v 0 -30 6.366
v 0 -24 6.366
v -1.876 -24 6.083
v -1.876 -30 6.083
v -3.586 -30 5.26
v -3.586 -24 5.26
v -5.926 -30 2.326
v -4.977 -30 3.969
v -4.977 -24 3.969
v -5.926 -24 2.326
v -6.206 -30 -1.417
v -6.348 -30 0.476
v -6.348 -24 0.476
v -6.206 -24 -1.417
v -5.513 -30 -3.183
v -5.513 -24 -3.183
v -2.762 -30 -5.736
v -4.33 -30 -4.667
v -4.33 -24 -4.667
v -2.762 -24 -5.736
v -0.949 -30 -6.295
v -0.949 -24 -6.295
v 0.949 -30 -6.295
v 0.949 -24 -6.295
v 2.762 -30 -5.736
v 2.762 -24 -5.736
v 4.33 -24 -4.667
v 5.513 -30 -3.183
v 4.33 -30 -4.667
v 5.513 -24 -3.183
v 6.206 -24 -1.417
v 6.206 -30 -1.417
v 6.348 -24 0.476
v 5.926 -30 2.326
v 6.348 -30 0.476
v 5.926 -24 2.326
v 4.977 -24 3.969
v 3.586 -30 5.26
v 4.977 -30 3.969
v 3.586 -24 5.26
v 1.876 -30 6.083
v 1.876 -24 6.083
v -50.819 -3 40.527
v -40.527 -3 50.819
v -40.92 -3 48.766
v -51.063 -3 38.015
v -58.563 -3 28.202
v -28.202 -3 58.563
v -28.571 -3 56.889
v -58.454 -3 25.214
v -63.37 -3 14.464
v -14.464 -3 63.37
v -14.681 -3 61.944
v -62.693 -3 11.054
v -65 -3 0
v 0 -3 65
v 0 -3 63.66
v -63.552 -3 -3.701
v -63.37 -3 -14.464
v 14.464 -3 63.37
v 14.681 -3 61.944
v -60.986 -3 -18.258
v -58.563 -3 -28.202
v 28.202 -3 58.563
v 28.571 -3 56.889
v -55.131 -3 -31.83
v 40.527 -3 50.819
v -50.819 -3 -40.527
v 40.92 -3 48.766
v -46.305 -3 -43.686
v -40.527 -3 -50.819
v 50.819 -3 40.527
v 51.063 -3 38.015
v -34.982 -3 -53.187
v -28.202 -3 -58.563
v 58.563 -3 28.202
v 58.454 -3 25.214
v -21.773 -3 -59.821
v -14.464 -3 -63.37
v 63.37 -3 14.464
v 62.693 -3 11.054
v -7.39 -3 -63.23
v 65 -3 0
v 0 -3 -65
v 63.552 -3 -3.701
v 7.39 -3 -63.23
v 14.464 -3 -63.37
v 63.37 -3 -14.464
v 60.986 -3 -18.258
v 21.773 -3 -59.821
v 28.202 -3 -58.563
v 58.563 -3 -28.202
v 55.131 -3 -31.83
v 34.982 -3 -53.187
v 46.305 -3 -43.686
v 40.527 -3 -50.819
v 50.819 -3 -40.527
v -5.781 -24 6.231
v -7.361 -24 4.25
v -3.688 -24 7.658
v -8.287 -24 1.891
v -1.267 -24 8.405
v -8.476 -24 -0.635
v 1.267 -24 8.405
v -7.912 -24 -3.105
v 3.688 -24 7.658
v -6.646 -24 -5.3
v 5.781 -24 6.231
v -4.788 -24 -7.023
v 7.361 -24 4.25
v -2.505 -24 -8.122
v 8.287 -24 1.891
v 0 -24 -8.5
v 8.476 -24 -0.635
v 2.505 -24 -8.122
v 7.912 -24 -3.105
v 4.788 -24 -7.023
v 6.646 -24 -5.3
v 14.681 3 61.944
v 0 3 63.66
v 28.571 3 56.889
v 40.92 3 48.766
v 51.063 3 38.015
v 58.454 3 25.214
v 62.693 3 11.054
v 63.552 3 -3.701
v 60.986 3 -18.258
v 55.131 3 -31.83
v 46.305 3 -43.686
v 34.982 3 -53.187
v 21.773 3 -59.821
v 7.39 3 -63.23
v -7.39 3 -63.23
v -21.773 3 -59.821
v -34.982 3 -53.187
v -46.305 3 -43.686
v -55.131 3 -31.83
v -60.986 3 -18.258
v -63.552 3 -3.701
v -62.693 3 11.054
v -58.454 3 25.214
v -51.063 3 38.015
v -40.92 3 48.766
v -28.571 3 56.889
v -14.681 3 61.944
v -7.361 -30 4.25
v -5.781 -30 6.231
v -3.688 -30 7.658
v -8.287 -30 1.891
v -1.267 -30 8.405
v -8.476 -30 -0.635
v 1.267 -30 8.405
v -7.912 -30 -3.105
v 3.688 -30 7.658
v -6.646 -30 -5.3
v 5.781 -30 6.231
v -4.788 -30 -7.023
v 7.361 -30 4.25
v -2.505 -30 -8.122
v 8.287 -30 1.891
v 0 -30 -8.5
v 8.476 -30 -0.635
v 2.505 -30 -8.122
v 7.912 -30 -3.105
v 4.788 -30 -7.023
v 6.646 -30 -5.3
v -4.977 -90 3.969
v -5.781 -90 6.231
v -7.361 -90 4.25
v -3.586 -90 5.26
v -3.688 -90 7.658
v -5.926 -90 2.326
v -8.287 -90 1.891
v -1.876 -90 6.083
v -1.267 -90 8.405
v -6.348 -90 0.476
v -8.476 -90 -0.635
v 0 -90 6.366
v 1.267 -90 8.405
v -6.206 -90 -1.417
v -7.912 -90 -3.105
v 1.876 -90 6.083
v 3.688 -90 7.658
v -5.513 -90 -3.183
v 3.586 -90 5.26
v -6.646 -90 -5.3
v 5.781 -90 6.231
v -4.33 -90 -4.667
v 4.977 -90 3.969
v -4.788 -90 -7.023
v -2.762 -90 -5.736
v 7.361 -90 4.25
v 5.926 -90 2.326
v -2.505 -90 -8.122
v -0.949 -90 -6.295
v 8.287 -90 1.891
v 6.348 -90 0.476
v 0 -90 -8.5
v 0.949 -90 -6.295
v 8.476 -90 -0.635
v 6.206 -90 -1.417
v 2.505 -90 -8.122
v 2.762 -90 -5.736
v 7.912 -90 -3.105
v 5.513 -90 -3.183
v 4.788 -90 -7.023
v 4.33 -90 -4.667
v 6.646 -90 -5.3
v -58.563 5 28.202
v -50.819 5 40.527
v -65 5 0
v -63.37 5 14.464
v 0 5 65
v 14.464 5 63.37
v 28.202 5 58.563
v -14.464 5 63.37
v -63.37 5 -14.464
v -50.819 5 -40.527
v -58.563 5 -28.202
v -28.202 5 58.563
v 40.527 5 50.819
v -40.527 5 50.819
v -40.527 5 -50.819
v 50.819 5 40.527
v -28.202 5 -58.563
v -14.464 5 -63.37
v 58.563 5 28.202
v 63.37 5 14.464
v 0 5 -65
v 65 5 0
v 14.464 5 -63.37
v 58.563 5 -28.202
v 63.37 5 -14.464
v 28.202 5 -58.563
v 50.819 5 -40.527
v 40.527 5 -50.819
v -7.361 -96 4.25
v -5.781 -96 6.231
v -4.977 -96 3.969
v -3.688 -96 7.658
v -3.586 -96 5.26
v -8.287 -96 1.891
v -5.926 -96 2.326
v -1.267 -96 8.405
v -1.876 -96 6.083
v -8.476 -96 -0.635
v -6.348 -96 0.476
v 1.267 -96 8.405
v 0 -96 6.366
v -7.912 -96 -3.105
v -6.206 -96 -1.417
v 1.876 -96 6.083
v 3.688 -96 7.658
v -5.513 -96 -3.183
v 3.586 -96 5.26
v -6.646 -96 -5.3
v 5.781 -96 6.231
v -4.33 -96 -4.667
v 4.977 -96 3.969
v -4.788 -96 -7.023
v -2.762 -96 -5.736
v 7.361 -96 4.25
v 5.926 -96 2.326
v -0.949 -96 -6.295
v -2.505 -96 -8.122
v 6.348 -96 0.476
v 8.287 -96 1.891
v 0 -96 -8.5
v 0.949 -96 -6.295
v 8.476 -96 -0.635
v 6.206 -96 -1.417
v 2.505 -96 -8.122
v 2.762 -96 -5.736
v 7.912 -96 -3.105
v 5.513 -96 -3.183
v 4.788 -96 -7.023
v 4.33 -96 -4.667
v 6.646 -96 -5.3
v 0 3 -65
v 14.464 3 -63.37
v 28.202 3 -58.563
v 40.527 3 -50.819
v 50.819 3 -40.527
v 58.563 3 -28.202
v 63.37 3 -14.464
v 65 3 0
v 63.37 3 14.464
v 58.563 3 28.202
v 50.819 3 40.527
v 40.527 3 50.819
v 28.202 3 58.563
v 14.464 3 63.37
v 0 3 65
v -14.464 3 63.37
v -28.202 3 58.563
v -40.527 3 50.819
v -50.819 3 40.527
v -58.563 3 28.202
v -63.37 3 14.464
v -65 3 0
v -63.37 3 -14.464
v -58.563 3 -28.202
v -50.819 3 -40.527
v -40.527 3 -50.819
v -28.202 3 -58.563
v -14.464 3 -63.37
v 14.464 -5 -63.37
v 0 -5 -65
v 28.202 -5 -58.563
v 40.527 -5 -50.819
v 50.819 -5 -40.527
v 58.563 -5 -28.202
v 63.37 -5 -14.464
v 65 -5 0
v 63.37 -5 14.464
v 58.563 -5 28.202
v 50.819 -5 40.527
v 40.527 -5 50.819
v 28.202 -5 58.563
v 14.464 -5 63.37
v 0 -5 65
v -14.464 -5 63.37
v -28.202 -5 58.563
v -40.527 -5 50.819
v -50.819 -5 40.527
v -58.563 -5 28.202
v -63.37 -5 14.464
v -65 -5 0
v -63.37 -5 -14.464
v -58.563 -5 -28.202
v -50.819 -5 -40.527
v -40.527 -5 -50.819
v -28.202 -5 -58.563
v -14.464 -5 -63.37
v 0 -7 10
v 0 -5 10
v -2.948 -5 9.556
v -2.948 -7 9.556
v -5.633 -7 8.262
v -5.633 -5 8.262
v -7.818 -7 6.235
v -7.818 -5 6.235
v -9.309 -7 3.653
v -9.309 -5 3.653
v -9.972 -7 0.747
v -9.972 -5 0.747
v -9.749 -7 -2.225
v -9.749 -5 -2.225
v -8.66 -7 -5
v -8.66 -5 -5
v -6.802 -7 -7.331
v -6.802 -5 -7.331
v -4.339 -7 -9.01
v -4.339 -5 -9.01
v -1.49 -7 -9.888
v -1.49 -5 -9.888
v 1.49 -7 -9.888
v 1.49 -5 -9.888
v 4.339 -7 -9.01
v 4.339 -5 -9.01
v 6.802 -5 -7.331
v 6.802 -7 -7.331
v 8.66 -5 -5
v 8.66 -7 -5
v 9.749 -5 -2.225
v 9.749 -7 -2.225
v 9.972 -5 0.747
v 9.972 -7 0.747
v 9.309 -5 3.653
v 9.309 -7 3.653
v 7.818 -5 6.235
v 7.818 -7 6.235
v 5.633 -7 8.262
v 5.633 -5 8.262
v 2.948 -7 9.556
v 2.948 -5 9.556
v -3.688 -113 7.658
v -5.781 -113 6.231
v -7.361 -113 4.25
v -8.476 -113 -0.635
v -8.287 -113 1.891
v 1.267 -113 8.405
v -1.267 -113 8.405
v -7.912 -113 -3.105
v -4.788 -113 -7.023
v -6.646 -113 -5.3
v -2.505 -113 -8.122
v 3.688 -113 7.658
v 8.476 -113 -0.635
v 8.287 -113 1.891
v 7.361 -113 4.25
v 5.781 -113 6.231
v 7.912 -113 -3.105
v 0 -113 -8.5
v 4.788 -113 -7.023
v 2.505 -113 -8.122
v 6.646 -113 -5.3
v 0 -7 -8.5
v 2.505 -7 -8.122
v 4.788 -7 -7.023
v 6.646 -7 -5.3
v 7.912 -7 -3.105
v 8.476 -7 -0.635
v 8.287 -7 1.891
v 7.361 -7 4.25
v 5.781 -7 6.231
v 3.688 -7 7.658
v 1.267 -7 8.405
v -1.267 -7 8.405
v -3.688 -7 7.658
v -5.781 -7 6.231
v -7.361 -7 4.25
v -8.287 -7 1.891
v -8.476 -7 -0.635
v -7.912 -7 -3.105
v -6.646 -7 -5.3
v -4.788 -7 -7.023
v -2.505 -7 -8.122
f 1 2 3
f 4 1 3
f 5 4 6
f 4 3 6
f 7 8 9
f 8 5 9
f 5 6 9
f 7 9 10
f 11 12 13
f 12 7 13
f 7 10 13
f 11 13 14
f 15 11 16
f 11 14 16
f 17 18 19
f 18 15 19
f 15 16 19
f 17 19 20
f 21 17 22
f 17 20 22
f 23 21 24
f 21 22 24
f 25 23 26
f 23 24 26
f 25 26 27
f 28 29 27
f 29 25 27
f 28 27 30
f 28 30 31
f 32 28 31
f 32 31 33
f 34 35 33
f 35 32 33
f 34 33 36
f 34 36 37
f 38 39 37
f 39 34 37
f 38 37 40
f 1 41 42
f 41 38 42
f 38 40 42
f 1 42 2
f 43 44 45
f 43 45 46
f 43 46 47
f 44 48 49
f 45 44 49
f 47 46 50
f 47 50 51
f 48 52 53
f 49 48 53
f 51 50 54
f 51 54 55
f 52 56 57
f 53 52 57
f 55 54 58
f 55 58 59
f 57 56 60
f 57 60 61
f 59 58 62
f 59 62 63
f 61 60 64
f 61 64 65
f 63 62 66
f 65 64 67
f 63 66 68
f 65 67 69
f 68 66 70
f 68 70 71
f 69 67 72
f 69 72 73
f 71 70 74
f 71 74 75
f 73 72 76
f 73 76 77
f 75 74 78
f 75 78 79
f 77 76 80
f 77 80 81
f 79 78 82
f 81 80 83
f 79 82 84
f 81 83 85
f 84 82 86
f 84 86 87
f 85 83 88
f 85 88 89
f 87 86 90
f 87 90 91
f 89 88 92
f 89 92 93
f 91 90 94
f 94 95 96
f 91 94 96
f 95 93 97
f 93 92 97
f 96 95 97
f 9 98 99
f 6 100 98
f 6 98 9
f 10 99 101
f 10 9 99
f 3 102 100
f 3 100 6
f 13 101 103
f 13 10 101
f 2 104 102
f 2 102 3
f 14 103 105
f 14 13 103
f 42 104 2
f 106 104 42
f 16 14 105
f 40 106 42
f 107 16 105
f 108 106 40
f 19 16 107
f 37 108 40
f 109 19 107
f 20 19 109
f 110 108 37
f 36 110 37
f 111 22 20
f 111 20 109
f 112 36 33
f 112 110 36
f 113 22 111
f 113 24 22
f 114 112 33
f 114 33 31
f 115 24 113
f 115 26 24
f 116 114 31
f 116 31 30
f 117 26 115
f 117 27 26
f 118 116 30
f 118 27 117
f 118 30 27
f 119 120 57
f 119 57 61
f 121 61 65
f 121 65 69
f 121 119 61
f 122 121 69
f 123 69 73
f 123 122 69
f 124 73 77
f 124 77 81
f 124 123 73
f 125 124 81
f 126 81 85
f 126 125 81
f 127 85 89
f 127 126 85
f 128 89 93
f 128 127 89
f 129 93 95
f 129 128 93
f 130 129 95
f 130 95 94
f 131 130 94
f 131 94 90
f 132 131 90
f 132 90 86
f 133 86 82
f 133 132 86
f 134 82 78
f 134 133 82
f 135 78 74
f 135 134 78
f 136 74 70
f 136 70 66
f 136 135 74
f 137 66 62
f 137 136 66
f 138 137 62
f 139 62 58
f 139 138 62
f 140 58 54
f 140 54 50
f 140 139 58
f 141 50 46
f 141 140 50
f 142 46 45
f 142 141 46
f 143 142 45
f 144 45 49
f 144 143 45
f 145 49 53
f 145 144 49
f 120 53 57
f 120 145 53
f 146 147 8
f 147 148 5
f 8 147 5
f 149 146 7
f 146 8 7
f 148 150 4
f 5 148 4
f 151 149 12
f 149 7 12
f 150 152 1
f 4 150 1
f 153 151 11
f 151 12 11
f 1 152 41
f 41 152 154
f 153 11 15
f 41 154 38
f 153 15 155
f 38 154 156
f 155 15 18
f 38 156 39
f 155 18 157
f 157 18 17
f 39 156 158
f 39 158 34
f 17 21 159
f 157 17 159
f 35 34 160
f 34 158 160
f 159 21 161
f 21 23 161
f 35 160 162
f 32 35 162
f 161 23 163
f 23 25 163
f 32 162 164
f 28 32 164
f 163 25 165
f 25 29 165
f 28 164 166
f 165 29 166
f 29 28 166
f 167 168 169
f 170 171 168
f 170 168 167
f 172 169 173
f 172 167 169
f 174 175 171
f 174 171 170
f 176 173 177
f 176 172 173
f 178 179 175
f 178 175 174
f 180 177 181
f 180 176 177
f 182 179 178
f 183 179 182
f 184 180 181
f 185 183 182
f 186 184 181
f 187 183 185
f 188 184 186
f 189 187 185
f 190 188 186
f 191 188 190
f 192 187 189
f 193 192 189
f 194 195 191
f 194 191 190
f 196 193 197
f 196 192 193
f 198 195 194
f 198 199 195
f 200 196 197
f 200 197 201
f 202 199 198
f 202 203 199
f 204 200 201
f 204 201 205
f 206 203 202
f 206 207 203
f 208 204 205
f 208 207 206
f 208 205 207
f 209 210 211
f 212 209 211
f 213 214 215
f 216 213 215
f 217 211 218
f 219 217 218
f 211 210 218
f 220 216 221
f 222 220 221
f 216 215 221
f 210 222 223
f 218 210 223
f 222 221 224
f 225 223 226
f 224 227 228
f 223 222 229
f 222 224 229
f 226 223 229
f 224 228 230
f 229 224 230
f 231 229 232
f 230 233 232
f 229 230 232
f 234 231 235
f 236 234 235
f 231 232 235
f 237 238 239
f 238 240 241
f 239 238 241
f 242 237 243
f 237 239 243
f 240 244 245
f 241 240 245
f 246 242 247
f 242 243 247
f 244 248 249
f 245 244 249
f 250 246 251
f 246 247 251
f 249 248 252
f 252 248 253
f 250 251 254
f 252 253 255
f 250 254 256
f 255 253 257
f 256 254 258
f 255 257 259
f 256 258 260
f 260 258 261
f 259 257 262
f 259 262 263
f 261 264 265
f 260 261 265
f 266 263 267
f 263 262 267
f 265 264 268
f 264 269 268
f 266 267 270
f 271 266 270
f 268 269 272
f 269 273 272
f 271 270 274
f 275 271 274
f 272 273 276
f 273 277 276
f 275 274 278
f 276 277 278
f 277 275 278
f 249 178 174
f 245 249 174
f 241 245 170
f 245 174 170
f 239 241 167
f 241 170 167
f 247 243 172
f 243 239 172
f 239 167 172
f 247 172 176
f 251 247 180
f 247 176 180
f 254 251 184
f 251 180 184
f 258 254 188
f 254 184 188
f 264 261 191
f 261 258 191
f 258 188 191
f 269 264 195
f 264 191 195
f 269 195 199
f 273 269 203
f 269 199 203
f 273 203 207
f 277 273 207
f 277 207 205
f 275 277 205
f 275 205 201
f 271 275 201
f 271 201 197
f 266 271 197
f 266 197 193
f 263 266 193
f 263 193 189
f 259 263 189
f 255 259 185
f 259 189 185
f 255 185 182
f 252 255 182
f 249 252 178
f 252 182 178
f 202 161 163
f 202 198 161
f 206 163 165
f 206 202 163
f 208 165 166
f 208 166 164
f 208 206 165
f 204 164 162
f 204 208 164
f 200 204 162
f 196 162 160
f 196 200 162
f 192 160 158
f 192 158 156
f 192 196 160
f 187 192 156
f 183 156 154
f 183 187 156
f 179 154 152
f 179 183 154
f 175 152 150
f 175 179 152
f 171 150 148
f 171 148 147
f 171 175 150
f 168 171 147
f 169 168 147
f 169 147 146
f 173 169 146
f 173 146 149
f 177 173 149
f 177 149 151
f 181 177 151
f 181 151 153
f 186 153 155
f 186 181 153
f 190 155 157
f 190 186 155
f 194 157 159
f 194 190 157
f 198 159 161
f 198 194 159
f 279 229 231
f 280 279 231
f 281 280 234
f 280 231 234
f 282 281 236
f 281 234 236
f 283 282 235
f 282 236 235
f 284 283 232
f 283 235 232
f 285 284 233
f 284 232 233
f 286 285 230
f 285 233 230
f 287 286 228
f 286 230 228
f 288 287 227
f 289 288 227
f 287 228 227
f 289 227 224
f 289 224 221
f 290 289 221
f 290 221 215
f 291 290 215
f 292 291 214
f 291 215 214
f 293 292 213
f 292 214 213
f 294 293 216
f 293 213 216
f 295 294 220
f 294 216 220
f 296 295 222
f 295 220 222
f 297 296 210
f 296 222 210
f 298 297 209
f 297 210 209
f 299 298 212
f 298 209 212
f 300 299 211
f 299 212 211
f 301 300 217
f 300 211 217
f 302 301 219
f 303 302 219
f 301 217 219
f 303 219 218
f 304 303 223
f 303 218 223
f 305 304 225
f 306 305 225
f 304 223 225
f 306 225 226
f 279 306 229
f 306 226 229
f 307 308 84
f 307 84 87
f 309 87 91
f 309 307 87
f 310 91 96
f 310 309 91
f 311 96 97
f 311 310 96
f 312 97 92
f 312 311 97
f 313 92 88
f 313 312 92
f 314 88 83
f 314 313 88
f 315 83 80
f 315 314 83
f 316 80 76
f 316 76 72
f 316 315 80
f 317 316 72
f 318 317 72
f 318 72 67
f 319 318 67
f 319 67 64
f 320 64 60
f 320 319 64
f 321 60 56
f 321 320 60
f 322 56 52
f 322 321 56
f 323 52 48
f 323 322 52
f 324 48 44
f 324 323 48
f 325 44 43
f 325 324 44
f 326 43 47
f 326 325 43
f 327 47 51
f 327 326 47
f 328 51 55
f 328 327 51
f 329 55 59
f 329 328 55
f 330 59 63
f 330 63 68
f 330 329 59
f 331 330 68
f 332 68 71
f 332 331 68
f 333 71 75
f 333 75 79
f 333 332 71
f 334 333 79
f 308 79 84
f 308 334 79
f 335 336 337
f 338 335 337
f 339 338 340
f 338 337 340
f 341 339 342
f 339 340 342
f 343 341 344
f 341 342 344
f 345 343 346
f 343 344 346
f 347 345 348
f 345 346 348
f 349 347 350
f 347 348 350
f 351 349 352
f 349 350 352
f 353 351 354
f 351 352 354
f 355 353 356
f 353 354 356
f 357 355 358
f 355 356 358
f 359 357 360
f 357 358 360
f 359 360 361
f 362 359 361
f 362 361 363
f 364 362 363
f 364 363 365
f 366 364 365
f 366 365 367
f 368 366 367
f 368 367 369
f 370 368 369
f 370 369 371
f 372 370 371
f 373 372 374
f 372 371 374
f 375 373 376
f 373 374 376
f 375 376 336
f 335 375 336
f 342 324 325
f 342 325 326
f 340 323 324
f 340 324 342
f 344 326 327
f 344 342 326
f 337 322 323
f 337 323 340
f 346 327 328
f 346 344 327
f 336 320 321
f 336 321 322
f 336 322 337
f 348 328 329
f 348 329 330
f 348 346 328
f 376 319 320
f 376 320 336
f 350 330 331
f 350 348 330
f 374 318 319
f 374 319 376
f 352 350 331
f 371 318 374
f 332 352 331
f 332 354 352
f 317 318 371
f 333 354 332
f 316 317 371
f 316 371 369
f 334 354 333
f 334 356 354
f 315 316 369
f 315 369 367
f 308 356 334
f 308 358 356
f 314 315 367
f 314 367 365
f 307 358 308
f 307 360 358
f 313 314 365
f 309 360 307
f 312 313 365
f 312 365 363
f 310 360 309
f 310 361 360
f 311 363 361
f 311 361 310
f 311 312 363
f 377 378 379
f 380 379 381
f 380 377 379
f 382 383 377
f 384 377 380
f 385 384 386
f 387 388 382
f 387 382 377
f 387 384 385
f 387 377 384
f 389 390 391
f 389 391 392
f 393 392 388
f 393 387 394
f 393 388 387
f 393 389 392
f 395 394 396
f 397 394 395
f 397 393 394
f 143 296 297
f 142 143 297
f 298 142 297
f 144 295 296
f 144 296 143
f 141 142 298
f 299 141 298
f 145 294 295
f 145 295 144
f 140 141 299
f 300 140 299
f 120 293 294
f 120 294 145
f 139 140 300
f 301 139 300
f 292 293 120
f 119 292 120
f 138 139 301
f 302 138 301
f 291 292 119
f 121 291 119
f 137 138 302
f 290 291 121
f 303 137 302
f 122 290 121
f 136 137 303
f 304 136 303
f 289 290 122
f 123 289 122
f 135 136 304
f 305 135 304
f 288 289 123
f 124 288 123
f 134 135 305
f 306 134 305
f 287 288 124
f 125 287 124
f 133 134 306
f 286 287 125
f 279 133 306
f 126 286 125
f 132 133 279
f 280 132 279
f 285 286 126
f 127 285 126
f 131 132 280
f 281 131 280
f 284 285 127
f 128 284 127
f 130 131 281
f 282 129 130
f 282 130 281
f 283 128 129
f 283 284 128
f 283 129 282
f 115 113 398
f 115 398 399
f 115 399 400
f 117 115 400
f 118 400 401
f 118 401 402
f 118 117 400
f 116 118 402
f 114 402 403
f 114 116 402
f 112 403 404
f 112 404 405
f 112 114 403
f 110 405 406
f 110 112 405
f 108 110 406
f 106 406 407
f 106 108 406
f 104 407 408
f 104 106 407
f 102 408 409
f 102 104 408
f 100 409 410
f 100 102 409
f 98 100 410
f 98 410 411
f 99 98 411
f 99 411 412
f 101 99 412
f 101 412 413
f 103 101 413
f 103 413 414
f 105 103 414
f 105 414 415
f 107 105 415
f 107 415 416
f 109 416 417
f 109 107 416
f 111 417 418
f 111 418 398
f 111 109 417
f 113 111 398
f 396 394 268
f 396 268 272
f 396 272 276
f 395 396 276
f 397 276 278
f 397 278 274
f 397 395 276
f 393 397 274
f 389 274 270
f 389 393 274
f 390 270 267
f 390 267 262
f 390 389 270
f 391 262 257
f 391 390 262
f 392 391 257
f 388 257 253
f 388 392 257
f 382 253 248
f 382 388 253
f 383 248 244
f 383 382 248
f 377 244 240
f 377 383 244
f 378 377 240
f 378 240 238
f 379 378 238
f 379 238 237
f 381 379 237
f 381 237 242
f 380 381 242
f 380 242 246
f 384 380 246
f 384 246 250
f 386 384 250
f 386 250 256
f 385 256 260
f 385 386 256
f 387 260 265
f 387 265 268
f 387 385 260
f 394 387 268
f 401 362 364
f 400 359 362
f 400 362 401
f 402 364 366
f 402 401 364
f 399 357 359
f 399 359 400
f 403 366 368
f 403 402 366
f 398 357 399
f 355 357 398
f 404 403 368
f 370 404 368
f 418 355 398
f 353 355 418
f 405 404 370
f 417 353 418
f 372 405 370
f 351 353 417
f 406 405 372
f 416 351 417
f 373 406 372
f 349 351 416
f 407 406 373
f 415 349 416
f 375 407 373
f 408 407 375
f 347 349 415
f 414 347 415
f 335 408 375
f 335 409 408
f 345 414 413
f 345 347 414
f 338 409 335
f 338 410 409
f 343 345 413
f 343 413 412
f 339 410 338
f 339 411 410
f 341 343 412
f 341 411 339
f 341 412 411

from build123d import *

# Parameters (mm, degrees)
SKETCH2_R           = 63.66
BOSS_EXTRUDE1_DEPTH = 5
SKETCH3_R           = 65
BOSS_EXTRUDE2_DEPTH = 2
SKETCH4_R           = 6.366
BOSS_EXTRUDE3_DEPTH = 108
SKETCH5_R           = 8.5
BOSS_EXTRUDE4_DEPTH = 17
SKETCH6_R           = 10
BOSS_EXTRUDE5_DEPTH = 2
BOSS_EXTRUDE6_START = 17
SKETCH7_R           = 8.5
BOSS_EXTRUDE6_DEPTH = 17
SKETCH8_R           = 8.5
BOSS_EXTRUDE7_DEPTH = 30


with BuildPart() as part:
    # Sketch2 → Boss-Extrude1 (new, symmetric)
    with BuildSketch(Plane(origin=(0, 0, 0), x_dir=(1, 0, 0), z_dir=(0, 1, 0))):
        with Locations(Location((0, 0, 0), (0, 0, 270))):
            Circle(SKETCH2_R)
    extrude(amount=BOSS_EXTRUDE1_DEPTH, both=True)

    # Sketch3 → Boss-Extrude2 (add)
    with BuildSketch(Plane.XZ.offset(5)):
        with Locations(Location((0, 0, 0), (0, 0, 270))):
            Circle(SKETCH3_R)
    boss_extrude2 = extrude(amount=-BOSS_EXTRUDE2_DEPTH)

    # Mirror1: Boss-Extrude2 across plane
    add(boss_extrude2.mirror(Plane.ZX))

    # Sketch4 → Boss-Extrude3 (add)
    with BuildSketch(Plane.XZ.offset(5)):
        with Locations(Location((0, 0, 0), (0, 0, 90))):
            Circle(SKETCH4_R)
    extrude(amount=BOSS_EXTRUDE3_DEPTH)

    # Sketch5 → Boss-Extrude4 (add)
    with BuildSketch(Plane.XZ.offset(113)):
        with Locations(Location((0, 0, 0), (0, 0, 270))):
            Circle(SKETCH5_R)
    extrude(amount=-BOSS_EXTRUDE4_DEPTH)

    # Sketch6 → Boss-Extrude5 (add)
    with BuildSketch(Plane.XZ.offset(5)):
        with Locations(Location((0, 0, 0), (0, 0, 90))):
            Circle(SKETCH6_R)
    extrude(amount=BOSS_EXTRUDE5_DEPTH)

    # Sketch7 → Boss-Extrude6 (add)
    with BuildSketch(Plane.XZ.offset(7).offset(BOSS_EXTRUDE6_START)):
        with Locations(Location((0, 0, 0), (0, 0, 270))):
            Circle(SKETCH7_R)
    extrude(amount=-BOSS_EXTRUDE6_DEPTH)

    # Sketch8 → Boss-Extrude7 (add, symmetric)
    with BuildSketch(Plane(origin=(0, -60, 0), x_dir=(-1, 0, 0), z_dir=(0, -1, 0))):
        with Locations(Location((0, 0, 0), (0, 0, 90))):
            Circle(SKETCH8_R)
    extrude(amount=BOSS_EXTRUDE7_DEPTH, both=True)


solid = part.part
